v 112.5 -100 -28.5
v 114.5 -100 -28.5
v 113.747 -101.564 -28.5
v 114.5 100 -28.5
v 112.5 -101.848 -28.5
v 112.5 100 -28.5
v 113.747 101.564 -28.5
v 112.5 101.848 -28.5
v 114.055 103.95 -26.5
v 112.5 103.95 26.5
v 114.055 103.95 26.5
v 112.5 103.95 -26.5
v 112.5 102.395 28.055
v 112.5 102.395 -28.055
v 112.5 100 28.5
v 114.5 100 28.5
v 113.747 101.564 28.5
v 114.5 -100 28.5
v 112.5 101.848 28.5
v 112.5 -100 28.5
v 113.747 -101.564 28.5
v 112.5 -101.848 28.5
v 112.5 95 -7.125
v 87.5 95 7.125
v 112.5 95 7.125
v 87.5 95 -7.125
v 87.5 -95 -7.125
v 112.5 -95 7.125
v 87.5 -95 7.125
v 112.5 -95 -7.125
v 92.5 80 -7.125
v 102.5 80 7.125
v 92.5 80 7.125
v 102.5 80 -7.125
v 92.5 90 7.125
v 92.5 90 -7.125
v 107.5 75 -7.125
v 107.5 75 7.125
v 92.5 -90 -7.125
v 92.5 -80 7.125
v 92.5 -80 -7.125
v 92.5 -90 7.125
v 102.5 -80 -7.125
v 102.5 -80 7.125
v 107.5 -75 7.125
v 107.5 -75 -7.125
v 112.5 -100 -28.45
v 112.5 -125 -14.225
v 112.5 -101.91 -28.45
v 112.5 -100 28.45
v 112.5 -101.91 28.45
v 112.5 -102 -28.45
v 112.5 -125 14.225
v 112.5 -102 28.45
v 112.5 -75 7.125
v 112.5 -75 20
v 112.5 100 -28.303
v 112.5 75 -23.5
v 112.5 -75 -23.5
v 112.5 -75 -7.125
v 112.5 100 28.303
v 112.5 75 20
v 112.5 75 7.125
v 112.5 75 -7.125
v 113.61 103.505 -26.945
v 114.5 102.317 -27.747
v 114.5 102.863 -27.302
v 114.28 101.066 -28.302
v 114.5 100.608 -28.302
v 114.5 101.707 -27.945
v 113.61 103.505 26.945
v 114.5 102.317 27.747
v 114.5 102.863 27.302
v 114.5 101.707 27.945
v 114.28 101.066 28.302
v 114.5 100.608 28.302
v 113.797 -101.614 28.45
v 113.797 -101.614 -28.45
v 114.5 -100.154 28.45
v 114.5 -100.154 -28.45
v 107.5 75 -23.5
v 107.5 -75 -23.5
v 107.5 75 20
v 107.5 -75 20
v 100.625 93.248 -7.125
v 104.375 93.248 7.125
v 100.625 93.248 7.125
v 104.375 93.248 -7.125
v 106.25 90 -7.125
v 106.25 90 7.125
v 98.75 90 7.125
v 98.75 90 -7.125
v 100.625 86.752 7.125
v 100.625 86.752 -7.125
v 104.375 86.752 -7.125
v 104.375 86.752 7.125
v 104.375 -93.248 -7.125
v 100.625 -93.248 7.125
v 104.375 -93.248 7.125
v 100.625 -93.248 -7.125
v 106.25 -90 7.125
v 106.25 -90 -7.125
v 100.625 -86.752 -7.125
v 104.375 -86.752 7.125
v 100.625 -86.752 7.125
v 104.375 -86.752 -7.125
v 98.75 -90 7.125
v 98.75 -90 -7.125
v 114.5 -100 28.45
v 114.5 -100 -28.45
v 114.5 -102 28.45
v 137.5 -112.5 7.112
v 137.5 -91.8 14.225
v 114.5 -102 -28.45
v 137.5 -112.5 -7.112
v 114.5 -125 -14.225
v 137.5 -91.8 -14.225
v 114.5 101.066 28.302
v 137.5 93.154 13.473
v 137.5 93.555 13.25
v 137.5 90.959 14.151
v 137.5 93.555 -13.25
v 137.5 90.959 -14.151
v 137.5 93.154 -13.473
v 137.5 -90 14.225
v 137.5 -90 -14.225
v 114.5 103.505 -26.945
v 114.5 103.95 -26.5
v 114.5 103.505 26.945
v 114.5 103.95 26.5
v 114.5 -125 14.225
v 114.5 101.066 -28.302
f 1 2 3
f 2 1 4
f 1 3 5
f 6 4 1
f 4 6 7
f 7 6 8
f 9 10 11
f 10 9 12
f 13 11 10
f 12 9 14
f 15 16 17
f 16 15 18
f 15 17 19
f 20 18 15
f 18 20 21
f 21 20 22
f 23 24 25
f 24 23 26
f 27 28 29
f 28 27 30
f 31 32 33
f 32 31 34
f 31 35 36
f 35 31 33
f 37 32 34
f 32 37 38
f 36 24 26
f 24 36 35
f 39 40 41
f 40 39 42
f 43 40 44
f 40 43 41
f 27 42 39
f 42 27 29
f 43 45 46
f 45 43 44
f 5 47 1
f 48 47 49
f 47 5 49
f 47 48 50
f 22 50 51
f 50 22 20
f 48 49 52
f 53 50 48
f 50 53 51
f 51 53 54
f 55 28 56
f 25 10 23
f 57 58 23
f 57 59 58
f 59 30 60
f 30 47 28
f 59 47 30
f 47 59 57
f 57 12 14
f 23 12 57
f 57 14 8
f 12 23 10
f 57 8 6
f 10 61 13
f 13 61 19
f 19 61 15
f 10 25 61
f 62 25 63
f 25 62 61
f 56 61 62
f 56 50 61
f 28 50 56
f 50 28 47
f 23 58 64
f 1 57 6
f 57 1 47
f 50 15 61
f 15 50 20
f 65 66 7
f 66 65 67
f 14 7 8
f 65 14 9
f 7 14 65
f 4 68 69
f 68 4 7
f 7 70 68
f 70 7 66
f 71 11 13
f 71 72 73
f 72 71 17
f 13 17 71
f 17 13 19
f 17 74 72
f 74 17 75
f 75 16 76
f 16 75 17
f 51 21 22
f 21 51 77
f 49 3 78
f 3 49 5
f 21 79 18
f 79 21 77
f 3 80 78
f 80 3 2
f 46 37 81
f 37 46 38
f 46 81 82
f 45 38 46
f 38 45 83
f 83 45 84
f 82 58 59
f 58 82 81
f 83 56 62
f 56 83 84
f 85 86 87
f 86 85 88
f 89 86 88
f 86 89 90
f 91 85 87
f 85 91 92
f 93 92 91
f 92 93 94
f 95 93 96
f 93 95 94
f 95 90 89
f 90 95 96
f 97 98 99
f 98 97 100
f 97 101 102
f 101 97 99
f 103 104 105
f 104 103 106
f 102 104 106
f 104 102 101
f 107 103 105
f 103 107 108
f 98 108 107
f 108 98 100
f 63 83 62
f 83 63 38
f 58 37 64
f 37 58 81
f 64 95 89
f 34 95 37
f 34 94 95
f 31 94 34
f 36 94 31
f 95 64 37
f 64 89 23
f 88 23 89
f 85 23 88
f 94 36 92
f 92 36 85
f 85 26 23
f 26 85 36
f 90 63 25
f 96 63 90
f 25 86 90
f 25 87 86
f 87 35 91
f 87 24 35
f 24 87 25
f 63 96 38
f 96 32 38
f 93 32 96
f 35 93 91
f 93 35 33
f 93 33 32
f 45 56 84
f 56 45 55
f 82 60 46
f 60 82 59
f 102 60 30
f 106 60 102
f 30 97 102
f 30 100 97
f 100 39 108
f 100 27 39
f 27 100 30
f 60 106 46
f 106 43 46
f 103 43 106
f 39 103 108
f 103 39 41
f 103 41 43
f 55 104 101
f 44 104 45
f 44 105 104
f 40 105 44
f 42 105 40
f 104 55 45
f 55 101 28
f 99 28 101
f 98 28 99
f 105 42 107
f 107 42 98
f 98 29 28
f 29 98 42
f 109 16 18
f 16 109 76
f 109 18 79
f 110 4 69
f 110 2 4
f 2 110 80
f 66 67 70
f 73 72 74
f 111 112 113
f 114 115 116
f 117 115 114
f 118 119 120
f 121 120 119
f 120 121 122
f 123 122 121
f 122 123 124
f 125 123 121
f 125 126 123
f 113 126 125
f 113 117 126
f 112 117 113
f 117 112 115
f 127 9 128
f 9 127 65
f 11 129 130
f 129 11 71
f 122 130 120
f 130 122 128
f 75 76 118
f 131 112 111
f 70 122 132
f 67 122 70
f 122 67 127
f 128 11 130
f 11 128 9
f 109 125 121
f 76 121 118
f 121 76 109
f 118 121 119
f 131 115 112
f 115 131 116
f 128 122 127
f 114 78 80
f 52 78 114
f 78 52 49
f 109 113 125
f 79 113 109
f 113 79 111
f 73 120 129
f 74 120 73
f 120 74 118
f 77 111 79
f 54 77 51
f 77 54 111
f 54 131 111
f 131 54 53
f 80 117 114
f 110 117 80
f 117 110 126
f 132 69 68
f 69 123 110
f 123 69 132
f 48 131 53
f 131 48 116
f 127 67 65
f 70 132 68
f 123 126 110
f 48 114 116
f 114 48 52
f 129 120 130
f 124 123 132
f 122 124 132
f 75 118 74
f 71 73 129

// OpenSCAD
// file: frame-piece-side.scad
/*
 * SPDX-FileCopyrightText: © 2024 Brian S. Stephan <bss@incorporeal.org>
 * SPDX-License-Identifier: GPL-3.0-or-later
 */

include <parameters.scad>
include <components.scad>
use <frame-piece-top-left-or-right.scad>
use <frame-piece-bottom-left-or-right.scad>

module side_frame_piece(lower=false) {
	piece_width = panel_support_width+frame_wall+frame_mount_column_width;
	difference() {
		// side piece is left/right agnostic
        frame(lower=lower);
		// minus the top and bottom
		top_left_or_right_frame_piece();
		bottom_left_or_right_frame_piece();
		// and just chop out the rest of the frame
		translate([piece_width, 0, 0]) cube([frame_x, frame_y+1, frame_z+1], center=true);
	}
}

side_frame_piece();
// file: frame-piece-bottom-left-or-right-extended.scad
/*
 * SPDX-FileCopyrightText: © 2024 Brian S. Stephan <bss@incorporeal.org>
 * SPDX-License-Identifier: GPL-3.0-or-later
 */

include <parameters.scad>
include <components.scad>
use <frame-piece-bottom-left-or-right.scad>

module bottom_piece_wall(lower=false) {
	// get a slice of the piece, to use it in extruding
	projection(cut=true) rotate([-90, 0, 0]) translate([0, frame_y/2-frame_bevel_height, 0])
		bottom_left_or_right_frame_piece(lower=lower);
}

module bottom_piece_extension(lower=false) {
	// combine the original with a shrunken piece to "pull" the wall out
	hull() {
		linear_extrude(height=frame_extension_y) scale([1, 0.5, 1]) bottom_piece_wall();
		linear_extrude(height=frame_bevel_height) bottom_piece_wall(lower=lower);
	}
}

module extended_bottom_left_or_right_frame_piece(lower=false) {
	bottom_left_or_right_frame_piece(lower=lower);
	translate([0, -frame_y/2+frame_bevel_height*2, 0]) rotate([90, 0, 0]) bottom_piece_extension(lower=lower);
}

extended_bottom_left_or_right_frame_piece();
// file: frame-left.scad
/*
 * SPDX-FileCopyrightText: © 2023 Brian S. Stephan <bss@incorporeal.org>
 * SPDX-License-Identifier: GPL-3.0-or-later
 */

include <parameters.scad>
include <components.scad>

module base_left_frame(lower=false) {
	difference() {
		frame(lower=lower);
		// chop the right edge off
		side_chopper();
	}
}

module left_frame(lower=false) {
	difference() {
		base_left_frame(lower=lower);
		// connection holes to other frames
		frame_connection_holes();

		// cable routing hole
		frame_cable_routing_hole();

		// aux button holes
		translate([-35, 101.5, 0]) rotate([270, 0, 0]) aux_control_three_button_cluster();
		translate([-35, (frame_y/2)-neutrik_panel_thickness-4, 0]) frame_cutout();
		translate([-72, (frame_y/2)-neutrik_panel_thickness-4, 0]) frame_cutout();
		translate([2, (frame_y/2)-neutrik_panel_thickness-4, 0]) frame_cutout();

		// neutrix button hole
		translate([frame_center_to_neutrik, (frame_y/2)-neutrik_panel_thickness, 0])
			rotate([90, 0, 0]) neutrik_d_mount();
		translate([frame_center_to_neutrik, (frame_y/2)-neutrik_panel_thickness-4, 0])
			frame_cutout();
	}
}

left_frame();
// file: frame-piece-side-extended-to-bottom.scad
/*
 * SPDX-FileCopyrightText: © 2024 Brian S. Stephan <bss@incorporeal.org>
 * SPDX-License-Identifier: GPL-3.0-or-later
 */

include <parameters.scad>
include <components.scad>
use <frame-piece-bottom-left-or-right-extended.scad>
use <frame-piece-side.scad>

module side_and_bottom_frame_piece_wall(lower=false) {
	// get a slice of the pieces, to use it in extruding
    projection(cut=true) rotate([0, 90, 0]) translate([frame_x/2-frame_bevel_height, 0, 0])
        side_frame_piece(lower=lower);
    projection(cut=true) translate([0, -frame_y/2+frame_wall, 0]) rotate([90, 90, 0]) bottom_piece_extension();
}

module side_and_bottom_frame_piece_extension(lower=false) {
	// combine the original with a shrunken piece to "pull" the wall out
	hull() {
		linear_extrude(height=frame_extension_y) scale([0.5, 0.90, 1]) side_and_bottom_frame_piece_wall(lower=lower);
		linear_extrude(height=frame_bevel_height) side_and_bottom_frame_piece_wall(lower=lower);
	}
}

module extra_extended_left_or_right_frame_piece(lower=false) {
	difference() {
		side_frame_piece(lower=lower);
		// chop off the old edge which is getting replaced with the extension
		translate([-frame_x/2+frame_bevel_height/2, 0, 0]) cube([frame_bevel_height, frame_y, frame_z], center=true);
	}
	translate([-frame_x/2+frame_bevel_height*2, 0, 0]) rotate([0, -90, 0]) side_and_bottom_frame_piece_extension(lower=lower);
}

extra_extended_left_or_right_frame_piece();
// file: frame-piece-bottom-left-or-right.scad
/*
 * SPDX-FileCopyrightText: © 2024 Brian S. Stephan <bss@incorporeal.org>
 * SPDX-License-Identifier: GPL-3.0-or-later
 */

include <parameters.scad>
include <components.scad>
use <frame-left.scad>

module bottom_left_or_right_frame_piece(lower=false) {
	piece_width = panel_support_width+frame_wall+frame_mount_column_width;
	intersection() {
		left_frame(lower=lower);
		difference() {
			// include the whole bottom wall (including mount columns)
			translate([0, -(frame_y/2)+(piece_width/2), 0]) cube([frame_x, piece_width, frame_z], center=true);
			// ...minus the frame wall and lip on the left
			translate([-frame_x/2+frame_wall/2, 0, 0])
				cube([frame_wall, frame_y, frame_z], center=true);
			// ...minus a slot for the combining piece to go into
			cube([frame_x, frame_y-(panel_support_width+frame_wall)*2, frame_z/4], center=true);
		}
	}
}

bottom_left_or_right_frame_piece();
// file: frame-piece-top-left-or-right.scad
/*
 * SPDX-FileCopyrightText: © 2024 Brian S. Stephan <bss@incorporeal.org>
 * SPDX-License-Identifier: GPL-3.0-or-later
 */

include <parameters.scad>
include <components.scad>
use <frame-left.scad>

module top_left_or_right_frame_piece() {
    piece_width = panel_support_width+frame_wall+frame_mount_column_width;

	intersection() {
		left_frame();
		difference() {
			// include the whole top wall (including mount columns)
			translate([0, (frame_y/2)-(piece_width/2), 0]) cube([frame_x, piece_width, frame_z], center=true);
			// ...minus the frame wall and lip on the left
			translate([-frame_x/2+frame_wall/2, 0, 0])
				cube([frame_wall, frame_y, frame_z], center=true);
			// ...minus a slot for the combining piece to go into
			cube([frame_x, frame_y-(panel_support_width+frame_wall)*2, frame_z/4], center=true);
		}
	}
}

top_left_or_right_frame_piece();
// file: parameters.scad
/*
 * SPDX-FileCopyrightText: © 2023 Brian S. Stephan <bss@incorporeal.org>
 * SPDX-License-Identifier: GPL-3.0-or-later
 */

// adjustments
hole_tolerance = 0.15;

// M2
m2_screw_selftap_radius = 0.95;

// M3
m3_screw_selftap_radius = 1.3;

// M4
m4_bolt_radius = 2 + hole_tolerance;
m4_bolt_countersink_radius = 6.1 + hole_tolerance;
m4_bolt_hex_exterior_radius = 3.6 + hole_tolerance;

// 24mm button
small_button_radius = 12 + hole_tolerance;

// 30mm button
big_button_radius = 15 + hole_tolerance;

// JLF mount dimensions
lever_mount_x = 53;
lever_mount_y = 95;
lever_mount_z = 2;

// standard lever hole
lever_plate_hole = 12;

// korean lever hole
korean_lever_plate_hole = 17.6;

// case dimensions
// base frame box. reminder: top of inside (including mounts) is chopped by panel_z for plates
frame_x = 233;
frame_y = 208;
frame_z = 57;

// degree to which the extended frame pieces stick out from the end of the frame
frame_extension_x = 25;
frame_extension_y = 25;

// this sinks the bottom and top of the frame inward a bit, and is used to math out two shapes
// when creating the frame box / overhang panel
frame_bevel_height = 2;
overhang_panel_bevel_height = 1;

frame_center_to_neutrik = 70;

// depth of the "lip" of the frame that the top plate sets into/supports the overhang
frame_wall = 4;

// width of the column in the frame corners to support the hex bolt
frame_mount_column_width = 20;

// per neutrik (mm)
neutrik_panel_thickness = 3;

// top plate, which can either be the whole plate ("inset") or the mounting frame for a plate that overhangs
panel_x = frame_x - (frame_wall * 2);
panel_y = frame_y - (frame_wall * 2);
panel_z = 5;

// how much the top plate x/y is expanded to overhang the frame
// note that this is relative to the top plate (so the wall is added back)
panel_overhang_amount = 8.5;
overhang_panel_x = panel_x + (frame_wall * 2) + (panel_overhang_amount * 2);
overhang_panel_y = panel_y + (frame_wall * 2) + (panel_overhang_amount * 2);

panel_to_frame_point_x = (panel_x/2)-10;
panel_to_frame_point_y = (panel_y/2)-10;

// frame interior that supports the top plates
panel_support_width = 5;

// neutrik D screw holes
neutrik_d_screw_radius = 1.6 + hole_tolerance;
neutrik_d_radius = 12 + hole_tolerance;

// GX 16 holes
gx16_radius = 7.8 + hole_tolerance;

// additional button radius for decorative panels, etc.
decorative_radius_scale = 1.75;
jumbo_decorative_radius_scale = 2;
// main file
/*
 * SPDX-FileCopyrightText: © 2023 Brian S. Stephan <bss@incorporeal.org>
 * SPDX-FileCopyrightText: © 2023 Luis Sebastián <buran@silosneeded.com>
 * SPDX-License-Identifier: GPL-3.0-or-later
 */

include <parameters.scad>
include <components.scad>
use <frame-piece-top-left-or-right.scad>
use <frame-piece-bottom-left-or-right.scad>
use <frame-piece-side-extended-to-bottom.scad>

module side_frame_piece() {
    piece_width = panel_support_width+frame_wall+frame_mount_column_width;

	difference() {
        rotate([0, 180, 0]) frame(lower=true);
            top_left_or_right_frame_piece();
		bottom_left_or_right_frame_piece();
		translate([piece_width, 0, 0]) cube([frame_x, frame_y+1, frame_z+1], center=true);
    }
}

module extra_extended_lower_right_frame_piece() {
    difference() {
        side_frame_piece();
        translate([-frame_x/2+frame_bevel_height/2, 0, 0]) cube([frame_bevel_height, frame_y, frame_z], center=true);
    }
    
    translate([-frame_x/2+frame_bevel_height*2, 0, 0]) rotate([0, -90, 0]) side_and_bottom_frame_piece_extension();
}

rotate([0, 180, 0])
    extra_extended_lower_right_frame_piece();
